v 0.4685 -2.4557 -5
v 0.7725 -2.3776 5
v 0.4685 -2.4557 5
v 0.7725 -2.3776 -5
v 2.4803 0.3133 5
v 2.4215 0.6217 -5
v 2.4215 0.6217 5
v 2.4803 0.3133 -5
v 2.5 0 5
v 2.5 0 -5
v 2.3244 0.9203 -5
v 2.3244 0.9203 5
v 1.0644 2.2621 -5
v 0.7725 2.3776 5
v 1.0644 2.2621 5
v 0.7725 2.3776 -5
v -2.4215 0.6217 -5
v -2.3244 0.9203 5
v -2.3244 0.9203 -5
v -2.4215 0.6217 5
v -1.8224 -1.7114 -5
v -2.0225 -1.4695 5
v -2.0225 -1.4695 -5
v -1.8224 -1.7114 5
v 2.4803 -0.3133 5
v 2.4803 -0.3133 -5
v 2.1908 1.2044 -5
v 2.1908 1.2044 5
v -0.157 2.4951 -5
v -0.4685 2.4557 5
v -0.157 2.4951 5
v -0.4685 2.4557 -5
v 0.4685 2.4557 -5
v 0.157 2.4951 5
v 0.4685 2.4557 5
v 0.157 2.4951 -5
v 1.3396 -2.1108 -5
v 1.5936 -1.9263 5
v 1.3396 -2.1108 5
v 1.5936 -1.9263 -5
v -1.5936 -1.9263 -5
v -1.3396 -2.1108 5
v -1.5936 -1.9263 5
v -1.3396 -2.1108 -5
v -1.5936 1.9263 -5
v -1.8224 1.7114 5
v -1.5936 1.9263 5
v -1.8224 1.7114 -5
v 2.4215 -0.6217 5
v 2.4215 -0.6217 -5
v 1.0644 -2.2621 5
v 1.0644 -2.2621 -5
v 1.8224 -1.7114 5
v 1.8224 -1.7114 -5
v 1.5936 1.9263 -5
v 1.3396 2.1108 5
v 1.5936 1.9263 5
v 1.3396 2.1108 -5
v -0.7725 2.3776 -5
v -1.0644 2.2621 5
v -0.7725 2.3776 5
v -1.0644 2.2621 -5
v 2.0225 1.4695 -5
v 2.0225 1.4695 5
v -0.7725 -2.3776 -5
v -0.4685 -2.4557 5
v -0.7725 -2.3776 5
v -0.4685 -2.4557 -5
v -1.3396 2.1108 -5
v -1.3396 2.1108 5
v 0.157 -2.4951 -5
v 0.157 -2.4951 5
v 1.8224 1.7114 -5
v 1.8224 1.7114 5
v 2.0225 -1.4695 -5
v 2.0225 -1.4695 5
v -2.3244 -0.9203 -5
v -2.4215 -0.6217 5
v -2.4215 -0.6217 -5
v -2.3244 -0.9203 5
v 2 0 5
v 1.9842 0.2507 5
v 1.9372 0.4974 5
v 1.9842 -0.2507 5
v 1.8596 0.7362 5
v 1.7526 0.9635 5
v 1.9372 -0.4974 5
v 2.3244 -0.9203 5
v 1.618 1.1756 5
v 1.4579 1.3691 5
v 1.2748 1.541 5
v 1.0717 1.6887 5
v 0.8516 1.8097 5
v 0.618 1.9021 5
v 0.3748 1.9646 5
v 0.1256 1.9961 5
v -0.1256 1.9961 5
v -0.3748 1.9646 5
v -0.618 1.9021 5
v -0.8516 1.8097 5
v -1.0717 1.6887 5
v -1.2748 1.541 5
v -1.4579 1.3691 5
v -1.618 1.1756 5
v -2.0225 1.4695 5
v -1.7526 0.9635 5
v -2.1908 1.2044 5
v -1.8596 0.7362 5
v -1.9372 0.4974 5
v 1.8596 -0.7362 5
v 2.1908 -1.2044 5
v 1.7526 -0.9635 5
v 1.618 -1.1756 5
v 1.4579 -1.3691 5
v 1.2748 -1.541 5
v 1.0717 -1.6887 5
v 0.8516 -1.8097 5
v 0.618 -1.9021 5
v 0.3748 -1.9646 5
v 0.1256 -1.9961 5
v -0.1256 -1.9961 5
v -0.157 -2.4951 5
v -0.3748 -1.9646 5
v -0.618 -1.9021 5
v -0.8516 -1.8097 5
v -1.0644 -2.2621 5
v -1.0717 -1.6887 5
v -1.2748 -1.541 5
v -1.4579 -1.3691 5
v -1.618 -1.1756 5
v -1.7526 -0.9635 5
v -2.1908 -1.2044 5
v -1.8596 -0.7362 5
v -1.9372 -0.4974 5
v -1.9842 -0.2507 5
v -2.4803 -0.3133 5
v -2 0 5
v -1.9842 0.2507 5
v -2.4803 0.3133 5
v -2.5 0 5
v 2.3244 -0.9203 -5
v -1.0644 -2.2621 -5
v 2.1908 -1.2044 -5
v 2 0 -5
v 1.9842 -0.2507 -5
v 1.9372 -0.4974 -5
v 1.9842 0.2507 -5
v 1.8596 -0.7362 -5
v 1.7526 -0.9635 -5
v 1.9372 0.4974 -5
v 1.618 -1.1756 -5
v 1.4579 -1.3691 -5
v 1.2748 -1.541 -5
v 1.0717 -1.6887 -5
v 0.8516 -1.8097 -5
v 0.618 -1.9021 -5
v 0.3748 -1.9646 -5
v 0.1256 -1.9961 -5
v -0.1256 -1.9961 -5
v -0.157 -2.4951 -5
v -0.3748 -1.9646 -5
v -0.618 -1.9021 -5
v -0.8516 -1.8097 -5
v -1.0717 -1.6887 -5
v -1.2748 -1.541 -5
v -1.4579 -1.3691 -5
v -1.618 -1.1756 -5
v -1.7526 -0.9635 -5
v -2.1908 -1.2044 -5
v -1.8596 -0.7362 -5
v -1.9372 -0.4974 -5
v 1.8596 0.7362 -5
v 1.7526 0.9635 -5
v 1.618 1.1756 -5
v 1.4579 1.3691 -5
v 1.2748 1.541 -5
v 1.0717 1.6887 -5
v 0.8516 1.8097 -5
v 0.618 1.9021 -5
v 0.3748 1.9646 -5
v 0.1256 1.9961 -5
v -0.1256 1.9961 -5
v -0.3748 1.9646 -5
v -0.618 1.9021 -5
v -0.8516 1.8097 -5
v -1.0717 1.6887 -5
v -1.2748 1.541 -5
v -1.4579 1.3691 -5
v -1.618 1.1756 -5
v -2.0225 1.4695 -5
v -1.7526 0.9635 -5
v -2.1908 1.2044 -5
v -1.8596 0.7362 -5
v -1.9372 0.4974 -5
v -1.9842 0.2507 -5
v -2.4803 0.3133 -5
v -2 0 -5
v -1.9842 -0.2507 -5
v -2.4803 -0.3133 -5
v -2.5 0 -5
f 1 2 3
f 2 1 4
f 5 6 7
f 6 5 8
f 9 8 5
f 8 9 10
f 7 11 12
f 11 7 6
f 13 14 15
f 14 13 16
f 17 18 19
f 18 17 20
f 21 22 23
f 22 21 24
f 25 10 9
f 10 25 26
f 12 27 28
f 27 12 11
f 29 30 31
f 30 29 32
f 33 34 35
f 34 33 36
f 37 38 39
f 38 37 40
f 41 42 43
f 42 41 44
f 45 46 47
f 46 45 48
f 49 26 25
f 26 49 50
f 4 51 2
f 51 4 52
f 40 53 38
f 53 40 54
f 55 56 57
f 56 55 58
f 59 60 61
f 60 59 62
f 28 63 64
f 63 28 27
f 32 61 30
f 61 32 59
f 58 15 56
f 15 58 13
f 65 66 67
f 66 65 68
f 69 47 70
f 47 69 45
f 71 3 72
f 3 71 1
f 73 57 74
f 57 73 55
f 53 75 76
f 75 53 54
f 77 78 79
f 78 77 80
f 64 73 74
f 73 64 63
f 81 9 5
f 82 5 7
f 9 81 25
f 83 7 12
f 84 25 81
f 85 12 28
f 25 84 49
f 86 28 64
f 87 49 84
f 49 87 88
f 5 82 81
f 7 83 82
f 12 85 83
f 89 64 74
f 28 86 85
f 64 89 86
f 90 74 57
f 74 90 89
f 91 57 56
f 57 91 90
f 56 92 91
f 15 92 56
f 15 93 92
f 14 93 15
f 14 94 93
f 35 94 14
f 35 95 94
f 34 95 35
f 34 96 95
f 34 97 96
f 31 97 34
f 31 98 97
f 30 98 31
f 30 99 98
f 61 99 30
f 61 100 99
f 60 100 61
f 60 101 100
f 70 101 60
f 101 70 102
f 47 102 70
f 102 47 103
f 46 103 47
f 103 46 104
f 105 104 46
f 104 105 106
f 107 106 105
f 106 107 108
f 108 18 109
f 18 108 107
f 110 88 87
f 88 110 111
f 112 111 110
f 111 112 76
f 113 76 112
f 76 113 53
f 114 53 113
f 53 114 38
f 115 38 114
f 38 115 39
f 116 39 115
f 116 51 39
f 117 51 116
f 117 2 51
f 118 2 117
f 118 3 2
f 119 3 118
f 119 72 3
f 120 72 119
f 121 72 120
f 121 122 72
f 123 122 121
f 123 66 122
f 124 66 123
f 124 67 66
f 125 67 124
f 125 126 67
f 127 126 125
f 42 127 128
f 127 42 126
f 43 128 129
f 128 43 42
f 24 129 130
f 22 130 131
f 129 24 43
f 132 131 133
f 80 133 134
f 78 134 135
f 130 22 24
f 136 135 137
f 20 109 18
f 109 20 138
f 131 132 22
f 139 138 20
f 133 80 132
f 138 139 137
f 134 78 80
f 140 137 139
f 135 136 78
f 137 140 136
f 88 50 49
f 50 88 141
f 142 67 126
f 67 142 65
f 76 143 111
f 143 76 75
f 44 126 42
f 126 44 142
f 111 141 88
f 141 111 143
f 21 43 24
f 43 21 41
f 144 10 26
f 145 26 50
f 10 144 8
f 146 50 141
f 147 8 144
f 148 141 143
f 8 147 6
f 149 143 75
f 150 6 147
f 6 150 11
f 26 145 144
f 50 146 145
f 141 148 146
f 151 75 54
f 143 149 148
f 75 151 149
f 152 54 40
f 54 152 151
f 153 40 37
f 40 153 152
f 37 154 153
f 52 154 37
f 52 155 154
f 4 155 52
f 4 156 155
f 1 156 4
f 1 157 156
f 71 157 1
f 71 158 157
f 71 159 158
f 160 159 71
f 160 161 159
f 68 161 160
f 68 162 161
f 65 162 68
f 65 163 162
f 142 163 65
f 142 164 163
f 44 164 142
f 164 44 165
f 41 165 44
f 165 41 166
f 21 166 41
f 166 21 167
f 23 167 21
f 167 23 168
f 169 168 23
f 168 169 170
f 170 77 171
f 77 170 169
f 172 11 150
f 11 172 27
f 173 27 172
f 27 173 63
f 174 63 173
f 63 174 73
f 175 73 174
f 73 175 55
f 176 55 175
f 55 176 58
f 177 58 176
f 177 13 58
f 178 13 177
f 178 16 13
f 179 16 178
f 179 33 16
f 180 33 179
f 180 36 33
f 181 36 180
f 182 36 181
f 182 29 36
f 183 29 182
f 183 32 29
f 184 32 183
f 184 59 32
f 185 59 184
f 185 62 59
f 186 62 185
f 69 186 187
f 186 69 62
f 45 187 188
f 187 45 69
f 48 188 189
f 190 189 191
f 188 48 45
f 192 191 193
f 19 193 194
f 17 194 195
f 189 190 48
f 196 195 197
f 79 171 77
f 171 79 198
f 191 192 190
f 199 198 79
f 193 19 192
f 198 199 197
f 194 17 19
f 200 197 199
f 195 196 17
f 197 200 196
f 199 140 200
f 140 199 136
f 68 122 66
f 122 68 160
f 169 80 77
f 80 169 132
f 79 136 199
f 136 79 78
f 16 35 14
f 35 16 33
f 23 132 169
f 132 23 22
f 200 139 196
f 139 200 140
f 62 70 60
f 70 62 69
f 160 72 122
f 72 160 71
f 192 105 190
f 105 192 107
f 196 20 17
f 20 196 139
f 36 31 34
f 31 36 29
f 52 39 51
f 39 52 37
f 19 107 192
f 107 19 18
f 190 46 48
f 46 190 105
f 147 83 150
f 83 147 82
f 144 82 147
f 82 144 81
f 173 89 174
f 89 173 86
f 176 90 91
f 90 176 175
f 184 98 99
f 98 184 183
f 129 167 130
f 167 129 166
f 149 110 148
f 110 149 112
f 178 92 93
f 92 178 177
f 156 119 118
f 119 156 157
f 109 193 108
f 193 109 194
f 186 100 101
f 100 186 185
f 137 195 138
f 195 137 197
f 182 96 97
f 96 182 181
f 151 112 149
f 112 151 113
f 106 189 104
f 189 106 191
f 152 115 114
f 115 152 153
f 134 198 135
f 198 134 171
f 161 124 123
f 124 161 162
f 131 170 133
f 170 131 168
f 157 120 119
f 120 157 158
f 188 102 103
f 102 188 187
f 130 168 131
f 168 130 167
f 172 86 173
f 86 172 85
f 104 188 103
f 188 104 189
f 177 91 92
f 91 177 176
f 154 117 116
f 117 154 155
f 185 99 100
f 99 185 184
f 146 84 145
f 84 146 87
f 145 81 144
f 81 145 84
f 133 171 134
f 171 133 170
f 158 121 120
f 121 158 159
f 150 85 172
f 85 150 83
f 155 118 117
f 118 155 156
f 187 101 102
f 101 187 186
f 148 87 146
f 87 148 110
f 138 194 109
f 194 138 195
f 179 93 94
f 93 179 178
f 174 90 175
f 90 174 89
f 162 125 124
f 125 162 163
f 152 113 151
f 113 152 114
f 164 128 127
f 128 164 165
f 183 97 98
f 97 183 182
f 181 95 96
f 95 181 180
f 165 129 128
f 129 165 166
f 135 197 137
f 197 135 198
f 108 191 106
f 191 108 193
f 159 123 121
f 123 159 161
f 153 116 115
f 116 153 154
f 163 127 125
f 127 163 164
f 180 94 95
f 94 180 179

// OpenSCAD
$fn = 50;


difference() {
	union() {
		translate(v = [0, 0, -5.0000000000]) {
			cylinder(h = 10, r = 2.5000000000);
		}
	}
	union() {
		translate(v = [0, 0, -100.0000000000]) {
			cylinder(h = 200, r = 2.0000000000);
		}
	}
}
